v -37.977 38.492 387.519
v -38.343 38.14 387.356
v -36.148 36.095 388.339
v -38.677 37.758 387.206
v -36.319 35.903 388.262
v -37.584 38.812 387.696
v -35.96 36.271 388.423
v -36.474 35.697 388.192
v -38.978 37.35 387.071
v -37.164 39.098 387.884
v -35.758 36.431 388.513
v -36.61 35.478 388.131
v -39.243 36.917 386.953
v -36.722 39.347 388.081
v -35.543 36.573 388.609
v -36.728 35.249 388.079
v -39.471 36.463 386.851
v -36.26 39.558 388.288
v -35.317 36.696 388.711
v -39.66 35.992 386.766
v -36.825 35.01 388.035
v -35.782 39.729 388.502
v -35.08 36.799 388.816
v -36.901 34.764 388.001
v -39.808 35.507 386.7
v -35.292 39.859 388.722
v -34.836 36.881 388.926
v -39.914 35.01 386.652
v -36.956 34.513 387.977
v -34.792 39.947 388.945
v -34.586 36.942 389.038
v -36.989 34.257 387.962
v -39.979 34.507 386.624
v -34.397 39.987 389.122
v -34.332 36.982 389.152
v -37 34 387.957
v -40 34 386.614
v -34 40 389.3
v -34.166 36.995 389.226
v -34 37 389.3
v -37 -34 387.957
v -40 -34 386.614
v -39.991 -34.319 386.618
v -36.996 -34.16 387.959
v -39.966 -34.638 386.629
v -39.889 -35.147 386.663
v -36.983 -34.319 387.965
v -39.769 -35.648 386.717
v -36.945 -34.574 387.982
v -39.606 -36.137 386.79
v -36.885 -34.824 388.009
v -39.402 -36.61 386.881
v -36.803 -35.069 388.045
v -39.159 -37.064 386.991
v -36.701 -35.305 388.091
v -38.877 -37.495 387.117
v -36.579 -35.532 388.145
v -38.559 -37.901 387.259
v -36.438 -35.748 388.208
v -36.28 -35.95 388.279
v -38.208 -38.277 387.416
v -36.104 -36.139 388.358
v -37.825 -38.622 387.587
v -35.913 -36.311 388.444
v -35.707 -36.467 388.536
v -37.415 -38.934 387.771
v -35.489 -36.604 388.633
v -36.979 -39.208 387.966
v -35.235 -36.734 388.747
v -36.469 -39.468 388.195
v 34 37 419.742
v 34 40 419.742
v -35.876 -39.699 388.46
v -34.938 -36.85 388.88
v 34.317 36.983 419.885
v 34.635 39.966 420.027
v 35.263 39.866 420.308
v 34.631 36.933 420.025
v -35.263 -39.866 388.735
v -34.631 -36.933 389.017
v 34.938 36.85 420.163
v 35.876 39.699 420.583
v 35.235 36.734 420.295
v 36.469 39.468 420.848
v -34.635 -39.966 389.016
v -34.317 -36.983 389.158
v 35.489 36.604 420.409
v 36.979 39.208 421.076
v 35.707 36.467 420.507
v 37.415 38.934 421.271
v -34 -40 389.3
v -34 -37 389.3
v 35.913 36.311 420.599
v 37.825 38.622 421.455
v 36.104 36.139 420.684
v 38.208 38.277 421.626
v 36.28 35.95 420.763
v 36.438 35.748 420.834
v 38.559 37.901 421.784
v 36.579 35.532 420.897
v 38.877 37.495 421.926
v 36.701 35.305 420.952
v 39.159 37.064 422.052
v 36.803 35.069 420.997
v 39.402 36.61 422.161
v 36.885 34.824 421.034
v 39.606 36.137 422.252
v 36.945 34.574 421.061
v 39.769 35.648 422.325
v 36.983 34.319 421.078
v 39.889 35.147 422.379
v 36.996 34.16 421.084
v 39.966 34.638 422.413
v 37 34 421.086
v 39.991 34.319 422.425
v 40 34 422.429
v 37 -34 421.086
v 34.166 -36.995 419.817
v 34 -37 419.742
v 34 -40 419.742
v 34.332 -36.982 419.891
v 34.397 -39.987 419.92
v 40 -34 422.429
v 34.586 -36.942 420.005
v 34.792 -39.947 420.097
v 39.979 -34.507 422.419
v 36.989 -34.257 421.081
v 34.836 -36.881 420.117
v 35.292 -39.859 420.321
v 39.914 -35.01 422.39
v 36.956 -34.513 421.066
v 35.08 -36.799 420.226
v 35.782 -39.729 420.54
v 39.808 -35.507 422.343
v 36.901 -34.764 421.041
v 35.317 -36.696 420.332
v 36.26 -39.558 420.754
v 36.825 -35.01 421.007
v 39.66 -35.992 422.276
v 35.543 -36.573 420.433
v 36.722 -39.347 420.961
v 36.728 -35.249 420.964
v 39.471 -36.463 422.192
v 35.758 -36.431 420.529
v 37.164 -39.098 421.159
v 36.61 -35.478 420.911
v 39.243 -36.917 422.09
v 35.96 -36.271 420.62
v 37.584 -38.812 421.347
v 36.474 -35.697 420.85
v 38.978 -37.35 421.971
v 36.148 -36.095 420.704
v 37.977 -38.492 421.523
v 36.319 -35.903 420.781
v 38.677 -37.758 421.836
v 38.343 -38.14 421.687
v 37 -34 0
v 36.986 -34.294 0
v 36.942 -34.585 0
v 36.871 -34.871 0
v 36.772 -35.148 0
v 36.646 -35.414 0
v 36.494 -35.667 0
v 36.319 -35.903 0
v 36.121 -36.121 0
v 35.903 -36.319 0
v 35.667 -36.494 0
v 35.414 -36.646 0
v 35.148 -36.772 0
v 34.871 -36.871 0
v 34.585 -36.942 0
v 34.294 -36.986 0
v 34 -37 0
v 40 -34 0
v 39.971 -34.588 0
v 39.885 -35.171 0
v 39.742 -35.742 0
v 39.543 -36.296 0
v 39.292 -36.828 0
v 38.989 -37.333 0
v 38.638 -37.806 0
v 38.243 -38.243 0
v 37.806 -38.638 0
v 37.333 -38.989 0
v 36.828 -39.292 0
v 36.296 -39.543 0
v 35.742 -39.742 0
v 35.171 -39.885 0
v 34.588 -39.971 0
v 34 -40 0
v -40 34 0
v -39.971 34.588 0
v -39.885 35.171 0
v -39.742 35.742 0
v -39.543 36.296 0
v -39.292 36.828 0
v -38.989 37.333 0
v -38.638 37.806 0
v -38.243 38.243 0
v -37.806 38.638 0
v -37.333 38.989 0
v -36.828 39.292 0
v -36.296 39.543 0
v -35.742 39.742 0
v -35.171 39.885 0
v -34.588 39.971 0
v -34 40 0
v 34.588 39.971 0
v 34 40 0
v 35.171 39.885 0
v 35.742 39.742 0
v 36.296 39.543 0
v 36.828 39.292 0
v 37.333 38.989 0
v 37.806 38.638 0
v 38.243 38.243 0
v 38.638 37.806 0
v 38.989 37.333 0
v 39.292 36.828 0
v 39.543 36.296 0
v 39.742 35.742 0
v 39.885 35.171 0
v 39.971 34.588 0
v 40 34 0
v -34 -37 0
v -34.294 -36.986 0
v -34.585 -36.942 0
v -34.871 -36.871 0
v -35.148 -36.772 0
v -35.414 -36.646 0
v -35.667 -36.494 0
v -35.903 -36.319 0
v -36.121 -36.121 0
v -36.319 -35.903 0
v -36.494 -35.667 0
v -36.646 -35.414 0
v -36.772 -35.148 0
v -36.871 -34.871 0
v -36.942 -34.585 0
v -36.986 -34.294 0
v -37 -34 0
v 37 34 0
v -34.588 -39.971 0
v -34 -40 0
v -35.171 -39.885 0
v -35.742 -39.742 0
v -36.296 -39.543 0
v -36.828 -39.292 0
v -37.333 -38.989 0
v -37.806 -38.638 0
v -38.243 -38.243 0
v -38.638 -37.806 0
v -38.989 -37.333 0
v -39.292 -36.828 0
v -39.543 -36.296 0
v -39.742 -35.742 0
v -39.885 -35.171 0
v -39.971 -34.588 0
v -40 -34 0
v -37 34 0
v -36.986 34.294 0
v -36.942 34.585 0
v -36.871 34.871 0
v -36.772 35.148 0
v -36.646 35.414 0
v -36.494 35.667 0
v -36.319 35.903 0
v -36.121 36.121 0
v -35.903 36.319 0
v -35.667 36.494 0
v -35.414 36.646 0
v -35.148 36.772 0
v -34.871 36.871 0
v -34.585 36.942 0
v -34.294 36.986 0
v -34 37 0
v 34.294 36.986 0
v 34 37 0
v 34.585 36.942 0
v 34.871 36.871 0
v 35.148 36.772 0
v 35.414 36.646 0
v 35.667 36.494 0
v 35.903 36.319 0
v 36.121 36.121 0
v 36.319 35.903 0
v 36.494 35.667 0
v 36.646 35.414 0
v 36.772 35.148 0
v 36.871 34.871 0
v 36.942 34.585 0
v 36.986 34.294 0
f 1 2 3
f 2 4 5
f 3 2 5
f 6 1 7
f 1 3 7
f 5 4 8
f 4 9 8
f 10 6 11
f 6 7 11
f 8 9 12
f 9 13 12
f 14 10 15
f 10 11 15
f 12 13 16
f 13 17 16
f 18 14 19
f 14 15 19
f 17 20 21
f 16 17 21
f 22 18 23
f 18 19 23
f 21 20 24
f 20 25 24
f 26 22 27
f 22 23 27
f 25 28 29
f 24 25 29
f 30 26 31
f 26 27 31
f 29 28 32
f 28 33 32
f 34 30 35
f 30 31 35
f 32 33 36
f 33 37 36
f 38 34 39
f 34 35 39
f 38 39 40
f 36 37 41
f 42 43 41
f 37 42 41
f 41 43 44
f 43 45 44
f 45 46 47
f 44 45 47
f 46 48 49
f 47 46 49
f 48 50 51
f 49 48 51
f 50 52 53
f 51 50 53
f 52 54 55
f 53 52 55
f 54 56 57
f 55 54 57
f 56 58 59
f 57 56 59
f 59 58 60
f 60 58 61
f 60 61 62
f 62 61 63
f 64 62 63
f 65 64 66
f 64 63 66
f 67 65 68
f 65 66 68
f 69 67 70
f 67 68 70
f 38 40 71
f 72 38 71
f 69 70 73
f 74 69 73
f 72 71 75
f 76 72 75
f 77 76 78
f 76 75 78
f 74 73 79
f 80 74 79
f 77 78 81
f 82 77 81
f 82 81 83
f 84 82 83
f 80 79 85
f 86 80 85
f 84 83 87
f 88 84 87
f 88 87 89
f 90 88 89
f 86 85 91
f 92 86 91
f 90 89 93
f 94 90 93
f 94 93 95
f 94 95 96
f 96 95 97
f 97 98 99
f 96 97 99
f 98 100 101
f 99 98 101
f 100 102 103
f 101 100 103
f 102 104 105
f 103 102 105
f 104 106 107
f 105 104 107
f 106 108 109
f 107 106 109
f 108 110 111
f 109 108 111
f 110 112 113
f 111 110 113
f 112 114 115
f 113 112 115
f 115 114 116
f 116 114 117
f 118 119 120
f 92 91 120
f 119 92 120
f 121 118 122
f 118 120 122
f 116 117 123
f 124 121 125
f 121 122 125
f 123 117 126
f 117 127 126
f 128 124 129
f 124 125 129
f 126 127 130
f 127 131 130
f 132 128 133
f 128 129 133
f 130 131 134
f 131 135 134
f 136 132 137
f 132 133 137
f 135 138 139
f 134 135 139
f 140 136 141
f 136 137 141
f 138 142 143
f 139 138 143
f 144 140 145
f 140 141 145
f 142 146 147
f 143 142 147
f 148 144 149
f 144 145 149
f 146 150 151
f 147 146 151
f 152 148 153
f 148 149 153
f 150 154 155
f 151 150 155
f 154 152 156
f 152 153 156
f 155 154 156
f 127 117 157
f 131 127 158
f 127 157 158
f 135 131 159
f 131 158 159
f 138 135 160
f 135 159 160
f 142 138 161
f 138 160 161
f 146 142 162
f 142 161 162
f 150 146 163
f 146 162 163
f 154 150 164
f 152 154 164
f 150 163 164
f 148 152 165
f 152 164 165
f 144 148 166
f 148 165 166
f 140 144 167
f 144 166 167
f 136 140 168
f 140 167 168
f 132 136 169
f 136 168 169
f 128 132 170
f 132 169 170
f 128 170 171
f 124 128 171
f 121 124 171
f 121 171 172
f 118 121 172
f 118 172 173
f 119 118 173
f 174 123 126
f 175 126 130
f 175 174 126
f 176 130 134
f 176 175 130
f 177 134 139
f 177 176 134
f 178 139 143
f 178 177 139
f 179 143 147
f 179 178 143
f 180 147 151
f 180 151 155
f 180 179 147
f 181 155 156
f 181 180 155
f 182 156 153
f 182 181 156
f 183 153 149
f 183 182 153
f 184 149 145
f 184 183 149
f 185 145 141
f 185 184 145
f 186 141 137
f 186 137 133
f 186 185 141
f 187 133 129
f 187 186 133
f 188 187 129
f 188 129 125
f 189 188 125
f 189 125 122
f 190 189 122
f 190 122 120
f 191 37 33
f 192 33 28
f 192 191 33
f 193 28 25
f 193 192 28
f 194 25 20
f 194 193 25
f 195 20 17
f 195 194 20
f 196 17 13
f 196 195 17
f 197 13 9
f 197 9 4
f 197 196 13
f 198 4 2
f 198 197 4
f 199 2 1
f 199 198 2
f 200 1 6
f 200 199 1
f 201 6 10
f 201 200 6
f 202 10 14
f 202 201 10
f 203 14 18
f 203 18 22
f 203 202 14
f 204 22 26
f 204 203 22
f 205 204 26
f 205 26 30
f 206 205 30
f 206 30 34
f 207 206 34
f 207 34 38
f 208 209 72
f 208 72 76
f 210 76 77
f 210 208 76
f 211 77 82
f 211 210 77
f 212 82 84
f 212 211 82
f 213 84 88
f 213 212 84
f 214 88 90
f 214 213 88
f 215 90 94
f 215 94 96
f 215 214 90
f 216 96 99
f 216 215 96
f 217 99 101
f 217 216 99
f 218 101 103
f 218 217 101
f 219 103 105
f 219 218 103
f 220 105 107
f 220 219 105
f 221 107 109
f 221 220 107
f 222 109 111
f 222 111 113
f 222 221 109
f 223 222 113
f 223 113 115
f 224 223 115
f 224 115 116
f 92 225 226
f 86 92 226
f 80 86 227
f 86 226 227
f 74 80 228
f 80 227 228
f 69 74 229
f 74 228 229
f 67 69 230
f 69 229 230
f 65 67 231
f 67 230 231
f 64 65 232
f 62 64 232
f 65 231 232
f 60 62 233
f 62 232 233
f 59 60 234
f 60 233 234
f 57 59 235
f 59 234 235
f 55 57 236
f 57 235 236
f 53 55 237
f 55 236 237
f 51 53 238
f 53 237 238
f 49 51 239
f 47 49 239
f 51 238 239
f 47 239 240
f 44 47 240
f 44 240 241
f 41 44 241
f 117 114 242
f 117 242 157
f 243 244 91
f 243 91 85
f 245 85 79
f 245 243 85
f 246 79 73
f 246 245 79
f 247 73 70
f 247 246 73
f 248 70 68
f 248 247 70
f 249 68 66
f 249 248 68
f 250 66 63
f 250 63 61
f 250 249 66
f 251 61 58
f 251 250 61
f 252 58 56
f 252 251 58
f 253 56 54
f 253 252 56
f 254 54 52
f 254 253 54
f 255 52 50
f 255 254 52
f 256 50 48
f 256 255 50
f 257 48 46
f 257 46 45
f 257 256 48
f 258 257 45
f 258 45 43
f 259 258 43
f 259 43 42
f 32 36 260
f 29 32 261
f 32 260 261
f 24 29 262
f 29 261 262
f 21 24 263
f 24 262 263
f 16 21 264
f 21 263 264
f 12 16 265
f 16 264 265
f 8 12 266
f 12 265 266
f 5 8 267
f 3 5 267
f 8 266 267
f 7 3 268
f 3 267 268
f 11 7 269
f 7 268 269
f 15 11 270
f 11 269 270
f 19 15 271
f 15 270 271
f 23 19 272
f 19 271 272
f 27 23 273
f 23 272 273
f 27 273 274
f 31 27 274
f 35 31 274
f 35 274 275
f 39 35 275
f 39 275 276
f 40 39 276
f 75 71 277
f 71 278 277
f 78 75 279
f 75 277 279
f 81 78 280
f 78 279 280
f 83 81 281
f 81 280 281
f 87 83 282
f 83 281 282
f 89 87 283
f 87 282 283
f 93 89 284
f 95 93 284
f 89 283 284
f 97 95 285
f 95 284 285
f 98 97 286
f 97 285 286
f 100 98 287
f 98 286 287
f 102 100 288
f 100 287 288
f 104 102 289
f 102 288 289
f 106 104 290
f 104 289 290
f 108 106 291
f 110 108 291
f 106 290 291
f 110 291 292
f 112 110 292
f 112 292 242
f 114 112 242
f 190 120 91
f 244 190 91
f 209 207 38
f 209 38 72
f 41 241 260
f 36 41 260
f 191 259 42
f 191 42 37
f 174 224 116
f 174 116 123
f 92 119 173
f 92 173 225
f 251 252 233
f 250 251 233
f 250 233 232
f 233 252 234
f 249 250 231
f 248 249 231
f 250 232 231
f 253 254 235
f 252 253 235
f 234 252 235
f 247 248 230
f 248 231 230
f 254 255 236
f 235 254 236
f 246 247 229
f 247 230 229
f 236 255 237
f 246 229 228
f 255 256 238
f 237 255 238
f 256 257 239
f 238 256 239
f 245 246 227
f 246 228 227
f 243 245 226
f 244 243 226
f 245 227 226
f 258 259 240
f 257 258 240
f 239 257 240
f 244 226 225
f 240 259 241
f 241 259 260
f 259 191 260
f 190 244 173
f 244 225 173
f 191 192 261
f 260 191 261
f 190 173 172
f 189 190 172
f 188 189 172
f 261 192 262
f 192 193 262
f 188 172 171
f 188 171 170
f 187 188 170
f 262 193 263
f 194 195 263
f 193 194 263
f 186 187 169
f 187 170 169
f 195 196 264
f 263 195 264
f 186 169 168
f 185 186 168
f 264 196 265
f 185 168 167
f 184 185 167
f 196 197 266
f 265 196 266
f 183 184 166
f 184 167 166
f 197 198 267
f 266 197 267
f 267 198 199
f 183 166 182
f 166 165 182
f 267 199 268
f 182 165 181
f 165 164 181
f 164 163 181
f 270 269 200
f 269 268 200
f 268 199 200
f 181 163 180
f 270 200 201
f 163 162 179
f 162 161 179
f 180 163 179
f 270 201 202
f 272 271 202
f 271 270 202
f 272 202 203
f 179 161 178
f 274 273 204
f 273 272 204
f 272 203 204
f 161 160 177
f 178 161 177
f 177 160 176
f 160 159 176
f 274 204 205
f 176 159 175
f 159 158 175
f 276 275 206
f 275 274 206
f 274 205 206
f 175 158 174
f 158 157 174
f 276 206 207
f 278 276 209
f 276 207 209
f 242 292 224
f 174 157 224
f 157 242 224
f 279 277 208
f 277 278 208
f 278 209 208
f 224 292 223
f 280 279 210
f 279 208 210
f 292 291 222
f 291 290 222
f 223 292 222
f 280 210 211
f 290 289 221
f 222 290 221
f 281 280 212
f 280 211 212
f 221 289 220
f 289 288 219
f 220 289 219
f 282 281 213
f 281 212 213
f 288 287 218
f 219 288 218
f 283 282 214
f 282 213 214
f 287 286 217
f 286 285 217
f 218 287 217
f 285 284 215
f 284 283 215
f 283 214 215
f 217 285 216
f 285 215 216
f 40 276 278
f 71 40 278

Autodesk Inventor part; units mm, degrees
ref_plane "YZ Plane" through (0, 0, 0) normal (1, 0, 0) x (0, 1, 0)
ref_plane "Start plane" through (0, 0, 0) normal (0, 0, 1) x (1, 0, 0)
ref_plane "End plane" through (0, 0, 1000) normal (0, 0, 1) x (1, 0, 0)
sketch "Sketch" plane through (0, 0, 0) normal (0, 0, 1) x (1, 0, 0)
  line L0 (-40, -34) -> (-40, 34)
  line L1 (-34, 40) -> (34, 40)
  line L2 (40, 34) -> (40, -34)
  line L3 (34, -40) -> (-34, -40)
  arc A0 (-40, -34) -> (-34, -40) centre (-34, -34) ccw
  arc A1 (40, 34) -> (34, 40) centre (34, 34) ccw
  arc A2 (-34, 40) -> (-40, 34) centre (-34, 34) ccw
  arc A3 (34, -40) -> (40, -34) centre (34, -34) ccw
  arc A4 (-34, 37) -> (-37, 34) centre (-34, 34) ccw
  line L4 (-34, 37) -> (34, 37)
  arc A5 (37, 34) -> (34, 37) centre (34, 34) ccw
  line L5 (37, 34) -> (37, -34)
  arc A6 (34, -37) -> (37, -34) centre (34, -34) ccw
  line L6 (34, -37) -> (-34, -37)
  arc A7 (-37, -34) -> (-34, -37) centre (-34, -34) ccw
  line L7 (-37, -34) -> (-37, 34)
  line L8 (0, 44.3196) -> (0, -44.3196) construction
  line L9 (-1340.2663, 0) -> (380.2663, 0) construction
  dimension "d7" = 6
  dimension "d9" = 80
  dimension "d11" = 80
  dimension "d12" = 3
  dimension "d15" = 40
  dimension "d16" = 40
extrude "Body" add sketch "Sketch" along normal up to surface (1000 mm away) from surface at 0
sketch "Sketch3" plane through (0, 0, 0) normal (0, 0, 1) x (1, 0, 0)
  line L0 (0, 0) -> (10, 0)
ref_plane "Work Plane3" through (0, 0, 0) normal (0, -1, 0) x (1, 0, 0)
sketch "Sketch5" plane through (0, 0, 0) normal (0, 1, 0) x (-1, 0, 0)
  line L0 (-40, 0) -> (-40, 1000) projected
  line L1 (40, 0) -> (40, 1000) projected
  line L2 (40, 0) -> (40, 1000) projected
  line L3 (40, 397.5702) -> (490, 397.5702) construction
  line L4 (-47.0166, 436.8676) -> (1027.0166, 436.8676) construction
  arc A0 (-47.0166, 436.8676) -> (490, 310) centre (490, 1510) ccw construction
  line L5 (-110, 538.8152) -> (1090, 538.8152) construction
  arc A1 (-110, 538.8152) -> (-47.0166, 436.8676) centre (4, 538.8152) ccw construction
  arc A2 (1027.0166, 436.8676) -> (1090, 538.8152) centre (976, 538.8152) ccw
  line L6 (-110, 538.8152) -> (-110, 578.8152)
  line L7 (1090, 538.8152) -> (1090, 578.8152)
  line L8 (-110, 578.8152) -> (490, 578.8152) construction
  line L9 (490, 578.8152) -> (490, 0)
  arc A3 (490, 310) -> (1027.0166, 436.8676) centre (490, 1510) ccw
  line L10 (490, 578.8152) -> (1090, 578.8152)
  point P0 (0, 0)
  dimension "d22" = 450
  dimension "d24" = 1200
  dimension "d25" = 114
  dimension "d26" = 40
  dimension "d27" = 1200
  dimension "d28" = 310
  dimension "d30" = 397.5702
sketch "Sketch6" plane through (0, 0, 0) normal (0, 1, 0) x (-1, 0, 0)
  line L0 (40, 0) -> (40, 1000) projected
  line L1 (40, 0) -> (40, 1000) projected
  line L2 (-40, 0) -> (-40, 1000) projected
  line L3 (-40, 0) -> (-40, 1000) projected
  line L4 (34, 1000) -> (40, 1000) projected
  line L5 (40, 1000) -> (-40, 1000)
  line L6 (-40, 433.3849) -> (40, 397.5702)
  arc A0 (-47.0166, 436.8676) -> (490, 310) centre (490, 1510) ccw construction
  line L7 (40, 386.6139) -> (-40, 422.4286)
  point P0 (0, 0)
  point P1 (40, 386.6139)
  dimension "d33" = 10
extrude "Extrusion2" cut sketch "Sketch6" along normal through all both and the other way through all
sketch "Sketch4" plane through (0, 0, 0) normal (0, -1, 0) x (1, 0, 0)
  line L0 (-1340.2663, 0) -> (380.2663, 0) projected
  line L1 (-1340.2663, 1000) -> (380.2663, 1000) projected
  dimension "d18" = 1000
equation "\"d7\" = G_IR"
equation "\"d9\" = G_W"
equation "\"d11\" = G_H"
equation "\"d12\" = G_T"
equation "\"d15\" = 0.5 * d9"
equation "\"d16\" = 0.5 * d11"
equation "\"d3\" = G_L"
equation "\"d24\" = d27"
equation "\"d25\" = 0.095 * d27"
equation "\"G_W\" = 80"
equation "\"G_H\" = 80"
equation "\"G_T\" = 3"
equation "\"G_IR\" = 6"
equation "\"G_L\" = d18"
equation "\"G_OFFSET_START\" = 0"
equation "\"G_OFFSET_END\" = 0"
properties part number "ANP 1781 Leg tube" material "Steel, Mild"
